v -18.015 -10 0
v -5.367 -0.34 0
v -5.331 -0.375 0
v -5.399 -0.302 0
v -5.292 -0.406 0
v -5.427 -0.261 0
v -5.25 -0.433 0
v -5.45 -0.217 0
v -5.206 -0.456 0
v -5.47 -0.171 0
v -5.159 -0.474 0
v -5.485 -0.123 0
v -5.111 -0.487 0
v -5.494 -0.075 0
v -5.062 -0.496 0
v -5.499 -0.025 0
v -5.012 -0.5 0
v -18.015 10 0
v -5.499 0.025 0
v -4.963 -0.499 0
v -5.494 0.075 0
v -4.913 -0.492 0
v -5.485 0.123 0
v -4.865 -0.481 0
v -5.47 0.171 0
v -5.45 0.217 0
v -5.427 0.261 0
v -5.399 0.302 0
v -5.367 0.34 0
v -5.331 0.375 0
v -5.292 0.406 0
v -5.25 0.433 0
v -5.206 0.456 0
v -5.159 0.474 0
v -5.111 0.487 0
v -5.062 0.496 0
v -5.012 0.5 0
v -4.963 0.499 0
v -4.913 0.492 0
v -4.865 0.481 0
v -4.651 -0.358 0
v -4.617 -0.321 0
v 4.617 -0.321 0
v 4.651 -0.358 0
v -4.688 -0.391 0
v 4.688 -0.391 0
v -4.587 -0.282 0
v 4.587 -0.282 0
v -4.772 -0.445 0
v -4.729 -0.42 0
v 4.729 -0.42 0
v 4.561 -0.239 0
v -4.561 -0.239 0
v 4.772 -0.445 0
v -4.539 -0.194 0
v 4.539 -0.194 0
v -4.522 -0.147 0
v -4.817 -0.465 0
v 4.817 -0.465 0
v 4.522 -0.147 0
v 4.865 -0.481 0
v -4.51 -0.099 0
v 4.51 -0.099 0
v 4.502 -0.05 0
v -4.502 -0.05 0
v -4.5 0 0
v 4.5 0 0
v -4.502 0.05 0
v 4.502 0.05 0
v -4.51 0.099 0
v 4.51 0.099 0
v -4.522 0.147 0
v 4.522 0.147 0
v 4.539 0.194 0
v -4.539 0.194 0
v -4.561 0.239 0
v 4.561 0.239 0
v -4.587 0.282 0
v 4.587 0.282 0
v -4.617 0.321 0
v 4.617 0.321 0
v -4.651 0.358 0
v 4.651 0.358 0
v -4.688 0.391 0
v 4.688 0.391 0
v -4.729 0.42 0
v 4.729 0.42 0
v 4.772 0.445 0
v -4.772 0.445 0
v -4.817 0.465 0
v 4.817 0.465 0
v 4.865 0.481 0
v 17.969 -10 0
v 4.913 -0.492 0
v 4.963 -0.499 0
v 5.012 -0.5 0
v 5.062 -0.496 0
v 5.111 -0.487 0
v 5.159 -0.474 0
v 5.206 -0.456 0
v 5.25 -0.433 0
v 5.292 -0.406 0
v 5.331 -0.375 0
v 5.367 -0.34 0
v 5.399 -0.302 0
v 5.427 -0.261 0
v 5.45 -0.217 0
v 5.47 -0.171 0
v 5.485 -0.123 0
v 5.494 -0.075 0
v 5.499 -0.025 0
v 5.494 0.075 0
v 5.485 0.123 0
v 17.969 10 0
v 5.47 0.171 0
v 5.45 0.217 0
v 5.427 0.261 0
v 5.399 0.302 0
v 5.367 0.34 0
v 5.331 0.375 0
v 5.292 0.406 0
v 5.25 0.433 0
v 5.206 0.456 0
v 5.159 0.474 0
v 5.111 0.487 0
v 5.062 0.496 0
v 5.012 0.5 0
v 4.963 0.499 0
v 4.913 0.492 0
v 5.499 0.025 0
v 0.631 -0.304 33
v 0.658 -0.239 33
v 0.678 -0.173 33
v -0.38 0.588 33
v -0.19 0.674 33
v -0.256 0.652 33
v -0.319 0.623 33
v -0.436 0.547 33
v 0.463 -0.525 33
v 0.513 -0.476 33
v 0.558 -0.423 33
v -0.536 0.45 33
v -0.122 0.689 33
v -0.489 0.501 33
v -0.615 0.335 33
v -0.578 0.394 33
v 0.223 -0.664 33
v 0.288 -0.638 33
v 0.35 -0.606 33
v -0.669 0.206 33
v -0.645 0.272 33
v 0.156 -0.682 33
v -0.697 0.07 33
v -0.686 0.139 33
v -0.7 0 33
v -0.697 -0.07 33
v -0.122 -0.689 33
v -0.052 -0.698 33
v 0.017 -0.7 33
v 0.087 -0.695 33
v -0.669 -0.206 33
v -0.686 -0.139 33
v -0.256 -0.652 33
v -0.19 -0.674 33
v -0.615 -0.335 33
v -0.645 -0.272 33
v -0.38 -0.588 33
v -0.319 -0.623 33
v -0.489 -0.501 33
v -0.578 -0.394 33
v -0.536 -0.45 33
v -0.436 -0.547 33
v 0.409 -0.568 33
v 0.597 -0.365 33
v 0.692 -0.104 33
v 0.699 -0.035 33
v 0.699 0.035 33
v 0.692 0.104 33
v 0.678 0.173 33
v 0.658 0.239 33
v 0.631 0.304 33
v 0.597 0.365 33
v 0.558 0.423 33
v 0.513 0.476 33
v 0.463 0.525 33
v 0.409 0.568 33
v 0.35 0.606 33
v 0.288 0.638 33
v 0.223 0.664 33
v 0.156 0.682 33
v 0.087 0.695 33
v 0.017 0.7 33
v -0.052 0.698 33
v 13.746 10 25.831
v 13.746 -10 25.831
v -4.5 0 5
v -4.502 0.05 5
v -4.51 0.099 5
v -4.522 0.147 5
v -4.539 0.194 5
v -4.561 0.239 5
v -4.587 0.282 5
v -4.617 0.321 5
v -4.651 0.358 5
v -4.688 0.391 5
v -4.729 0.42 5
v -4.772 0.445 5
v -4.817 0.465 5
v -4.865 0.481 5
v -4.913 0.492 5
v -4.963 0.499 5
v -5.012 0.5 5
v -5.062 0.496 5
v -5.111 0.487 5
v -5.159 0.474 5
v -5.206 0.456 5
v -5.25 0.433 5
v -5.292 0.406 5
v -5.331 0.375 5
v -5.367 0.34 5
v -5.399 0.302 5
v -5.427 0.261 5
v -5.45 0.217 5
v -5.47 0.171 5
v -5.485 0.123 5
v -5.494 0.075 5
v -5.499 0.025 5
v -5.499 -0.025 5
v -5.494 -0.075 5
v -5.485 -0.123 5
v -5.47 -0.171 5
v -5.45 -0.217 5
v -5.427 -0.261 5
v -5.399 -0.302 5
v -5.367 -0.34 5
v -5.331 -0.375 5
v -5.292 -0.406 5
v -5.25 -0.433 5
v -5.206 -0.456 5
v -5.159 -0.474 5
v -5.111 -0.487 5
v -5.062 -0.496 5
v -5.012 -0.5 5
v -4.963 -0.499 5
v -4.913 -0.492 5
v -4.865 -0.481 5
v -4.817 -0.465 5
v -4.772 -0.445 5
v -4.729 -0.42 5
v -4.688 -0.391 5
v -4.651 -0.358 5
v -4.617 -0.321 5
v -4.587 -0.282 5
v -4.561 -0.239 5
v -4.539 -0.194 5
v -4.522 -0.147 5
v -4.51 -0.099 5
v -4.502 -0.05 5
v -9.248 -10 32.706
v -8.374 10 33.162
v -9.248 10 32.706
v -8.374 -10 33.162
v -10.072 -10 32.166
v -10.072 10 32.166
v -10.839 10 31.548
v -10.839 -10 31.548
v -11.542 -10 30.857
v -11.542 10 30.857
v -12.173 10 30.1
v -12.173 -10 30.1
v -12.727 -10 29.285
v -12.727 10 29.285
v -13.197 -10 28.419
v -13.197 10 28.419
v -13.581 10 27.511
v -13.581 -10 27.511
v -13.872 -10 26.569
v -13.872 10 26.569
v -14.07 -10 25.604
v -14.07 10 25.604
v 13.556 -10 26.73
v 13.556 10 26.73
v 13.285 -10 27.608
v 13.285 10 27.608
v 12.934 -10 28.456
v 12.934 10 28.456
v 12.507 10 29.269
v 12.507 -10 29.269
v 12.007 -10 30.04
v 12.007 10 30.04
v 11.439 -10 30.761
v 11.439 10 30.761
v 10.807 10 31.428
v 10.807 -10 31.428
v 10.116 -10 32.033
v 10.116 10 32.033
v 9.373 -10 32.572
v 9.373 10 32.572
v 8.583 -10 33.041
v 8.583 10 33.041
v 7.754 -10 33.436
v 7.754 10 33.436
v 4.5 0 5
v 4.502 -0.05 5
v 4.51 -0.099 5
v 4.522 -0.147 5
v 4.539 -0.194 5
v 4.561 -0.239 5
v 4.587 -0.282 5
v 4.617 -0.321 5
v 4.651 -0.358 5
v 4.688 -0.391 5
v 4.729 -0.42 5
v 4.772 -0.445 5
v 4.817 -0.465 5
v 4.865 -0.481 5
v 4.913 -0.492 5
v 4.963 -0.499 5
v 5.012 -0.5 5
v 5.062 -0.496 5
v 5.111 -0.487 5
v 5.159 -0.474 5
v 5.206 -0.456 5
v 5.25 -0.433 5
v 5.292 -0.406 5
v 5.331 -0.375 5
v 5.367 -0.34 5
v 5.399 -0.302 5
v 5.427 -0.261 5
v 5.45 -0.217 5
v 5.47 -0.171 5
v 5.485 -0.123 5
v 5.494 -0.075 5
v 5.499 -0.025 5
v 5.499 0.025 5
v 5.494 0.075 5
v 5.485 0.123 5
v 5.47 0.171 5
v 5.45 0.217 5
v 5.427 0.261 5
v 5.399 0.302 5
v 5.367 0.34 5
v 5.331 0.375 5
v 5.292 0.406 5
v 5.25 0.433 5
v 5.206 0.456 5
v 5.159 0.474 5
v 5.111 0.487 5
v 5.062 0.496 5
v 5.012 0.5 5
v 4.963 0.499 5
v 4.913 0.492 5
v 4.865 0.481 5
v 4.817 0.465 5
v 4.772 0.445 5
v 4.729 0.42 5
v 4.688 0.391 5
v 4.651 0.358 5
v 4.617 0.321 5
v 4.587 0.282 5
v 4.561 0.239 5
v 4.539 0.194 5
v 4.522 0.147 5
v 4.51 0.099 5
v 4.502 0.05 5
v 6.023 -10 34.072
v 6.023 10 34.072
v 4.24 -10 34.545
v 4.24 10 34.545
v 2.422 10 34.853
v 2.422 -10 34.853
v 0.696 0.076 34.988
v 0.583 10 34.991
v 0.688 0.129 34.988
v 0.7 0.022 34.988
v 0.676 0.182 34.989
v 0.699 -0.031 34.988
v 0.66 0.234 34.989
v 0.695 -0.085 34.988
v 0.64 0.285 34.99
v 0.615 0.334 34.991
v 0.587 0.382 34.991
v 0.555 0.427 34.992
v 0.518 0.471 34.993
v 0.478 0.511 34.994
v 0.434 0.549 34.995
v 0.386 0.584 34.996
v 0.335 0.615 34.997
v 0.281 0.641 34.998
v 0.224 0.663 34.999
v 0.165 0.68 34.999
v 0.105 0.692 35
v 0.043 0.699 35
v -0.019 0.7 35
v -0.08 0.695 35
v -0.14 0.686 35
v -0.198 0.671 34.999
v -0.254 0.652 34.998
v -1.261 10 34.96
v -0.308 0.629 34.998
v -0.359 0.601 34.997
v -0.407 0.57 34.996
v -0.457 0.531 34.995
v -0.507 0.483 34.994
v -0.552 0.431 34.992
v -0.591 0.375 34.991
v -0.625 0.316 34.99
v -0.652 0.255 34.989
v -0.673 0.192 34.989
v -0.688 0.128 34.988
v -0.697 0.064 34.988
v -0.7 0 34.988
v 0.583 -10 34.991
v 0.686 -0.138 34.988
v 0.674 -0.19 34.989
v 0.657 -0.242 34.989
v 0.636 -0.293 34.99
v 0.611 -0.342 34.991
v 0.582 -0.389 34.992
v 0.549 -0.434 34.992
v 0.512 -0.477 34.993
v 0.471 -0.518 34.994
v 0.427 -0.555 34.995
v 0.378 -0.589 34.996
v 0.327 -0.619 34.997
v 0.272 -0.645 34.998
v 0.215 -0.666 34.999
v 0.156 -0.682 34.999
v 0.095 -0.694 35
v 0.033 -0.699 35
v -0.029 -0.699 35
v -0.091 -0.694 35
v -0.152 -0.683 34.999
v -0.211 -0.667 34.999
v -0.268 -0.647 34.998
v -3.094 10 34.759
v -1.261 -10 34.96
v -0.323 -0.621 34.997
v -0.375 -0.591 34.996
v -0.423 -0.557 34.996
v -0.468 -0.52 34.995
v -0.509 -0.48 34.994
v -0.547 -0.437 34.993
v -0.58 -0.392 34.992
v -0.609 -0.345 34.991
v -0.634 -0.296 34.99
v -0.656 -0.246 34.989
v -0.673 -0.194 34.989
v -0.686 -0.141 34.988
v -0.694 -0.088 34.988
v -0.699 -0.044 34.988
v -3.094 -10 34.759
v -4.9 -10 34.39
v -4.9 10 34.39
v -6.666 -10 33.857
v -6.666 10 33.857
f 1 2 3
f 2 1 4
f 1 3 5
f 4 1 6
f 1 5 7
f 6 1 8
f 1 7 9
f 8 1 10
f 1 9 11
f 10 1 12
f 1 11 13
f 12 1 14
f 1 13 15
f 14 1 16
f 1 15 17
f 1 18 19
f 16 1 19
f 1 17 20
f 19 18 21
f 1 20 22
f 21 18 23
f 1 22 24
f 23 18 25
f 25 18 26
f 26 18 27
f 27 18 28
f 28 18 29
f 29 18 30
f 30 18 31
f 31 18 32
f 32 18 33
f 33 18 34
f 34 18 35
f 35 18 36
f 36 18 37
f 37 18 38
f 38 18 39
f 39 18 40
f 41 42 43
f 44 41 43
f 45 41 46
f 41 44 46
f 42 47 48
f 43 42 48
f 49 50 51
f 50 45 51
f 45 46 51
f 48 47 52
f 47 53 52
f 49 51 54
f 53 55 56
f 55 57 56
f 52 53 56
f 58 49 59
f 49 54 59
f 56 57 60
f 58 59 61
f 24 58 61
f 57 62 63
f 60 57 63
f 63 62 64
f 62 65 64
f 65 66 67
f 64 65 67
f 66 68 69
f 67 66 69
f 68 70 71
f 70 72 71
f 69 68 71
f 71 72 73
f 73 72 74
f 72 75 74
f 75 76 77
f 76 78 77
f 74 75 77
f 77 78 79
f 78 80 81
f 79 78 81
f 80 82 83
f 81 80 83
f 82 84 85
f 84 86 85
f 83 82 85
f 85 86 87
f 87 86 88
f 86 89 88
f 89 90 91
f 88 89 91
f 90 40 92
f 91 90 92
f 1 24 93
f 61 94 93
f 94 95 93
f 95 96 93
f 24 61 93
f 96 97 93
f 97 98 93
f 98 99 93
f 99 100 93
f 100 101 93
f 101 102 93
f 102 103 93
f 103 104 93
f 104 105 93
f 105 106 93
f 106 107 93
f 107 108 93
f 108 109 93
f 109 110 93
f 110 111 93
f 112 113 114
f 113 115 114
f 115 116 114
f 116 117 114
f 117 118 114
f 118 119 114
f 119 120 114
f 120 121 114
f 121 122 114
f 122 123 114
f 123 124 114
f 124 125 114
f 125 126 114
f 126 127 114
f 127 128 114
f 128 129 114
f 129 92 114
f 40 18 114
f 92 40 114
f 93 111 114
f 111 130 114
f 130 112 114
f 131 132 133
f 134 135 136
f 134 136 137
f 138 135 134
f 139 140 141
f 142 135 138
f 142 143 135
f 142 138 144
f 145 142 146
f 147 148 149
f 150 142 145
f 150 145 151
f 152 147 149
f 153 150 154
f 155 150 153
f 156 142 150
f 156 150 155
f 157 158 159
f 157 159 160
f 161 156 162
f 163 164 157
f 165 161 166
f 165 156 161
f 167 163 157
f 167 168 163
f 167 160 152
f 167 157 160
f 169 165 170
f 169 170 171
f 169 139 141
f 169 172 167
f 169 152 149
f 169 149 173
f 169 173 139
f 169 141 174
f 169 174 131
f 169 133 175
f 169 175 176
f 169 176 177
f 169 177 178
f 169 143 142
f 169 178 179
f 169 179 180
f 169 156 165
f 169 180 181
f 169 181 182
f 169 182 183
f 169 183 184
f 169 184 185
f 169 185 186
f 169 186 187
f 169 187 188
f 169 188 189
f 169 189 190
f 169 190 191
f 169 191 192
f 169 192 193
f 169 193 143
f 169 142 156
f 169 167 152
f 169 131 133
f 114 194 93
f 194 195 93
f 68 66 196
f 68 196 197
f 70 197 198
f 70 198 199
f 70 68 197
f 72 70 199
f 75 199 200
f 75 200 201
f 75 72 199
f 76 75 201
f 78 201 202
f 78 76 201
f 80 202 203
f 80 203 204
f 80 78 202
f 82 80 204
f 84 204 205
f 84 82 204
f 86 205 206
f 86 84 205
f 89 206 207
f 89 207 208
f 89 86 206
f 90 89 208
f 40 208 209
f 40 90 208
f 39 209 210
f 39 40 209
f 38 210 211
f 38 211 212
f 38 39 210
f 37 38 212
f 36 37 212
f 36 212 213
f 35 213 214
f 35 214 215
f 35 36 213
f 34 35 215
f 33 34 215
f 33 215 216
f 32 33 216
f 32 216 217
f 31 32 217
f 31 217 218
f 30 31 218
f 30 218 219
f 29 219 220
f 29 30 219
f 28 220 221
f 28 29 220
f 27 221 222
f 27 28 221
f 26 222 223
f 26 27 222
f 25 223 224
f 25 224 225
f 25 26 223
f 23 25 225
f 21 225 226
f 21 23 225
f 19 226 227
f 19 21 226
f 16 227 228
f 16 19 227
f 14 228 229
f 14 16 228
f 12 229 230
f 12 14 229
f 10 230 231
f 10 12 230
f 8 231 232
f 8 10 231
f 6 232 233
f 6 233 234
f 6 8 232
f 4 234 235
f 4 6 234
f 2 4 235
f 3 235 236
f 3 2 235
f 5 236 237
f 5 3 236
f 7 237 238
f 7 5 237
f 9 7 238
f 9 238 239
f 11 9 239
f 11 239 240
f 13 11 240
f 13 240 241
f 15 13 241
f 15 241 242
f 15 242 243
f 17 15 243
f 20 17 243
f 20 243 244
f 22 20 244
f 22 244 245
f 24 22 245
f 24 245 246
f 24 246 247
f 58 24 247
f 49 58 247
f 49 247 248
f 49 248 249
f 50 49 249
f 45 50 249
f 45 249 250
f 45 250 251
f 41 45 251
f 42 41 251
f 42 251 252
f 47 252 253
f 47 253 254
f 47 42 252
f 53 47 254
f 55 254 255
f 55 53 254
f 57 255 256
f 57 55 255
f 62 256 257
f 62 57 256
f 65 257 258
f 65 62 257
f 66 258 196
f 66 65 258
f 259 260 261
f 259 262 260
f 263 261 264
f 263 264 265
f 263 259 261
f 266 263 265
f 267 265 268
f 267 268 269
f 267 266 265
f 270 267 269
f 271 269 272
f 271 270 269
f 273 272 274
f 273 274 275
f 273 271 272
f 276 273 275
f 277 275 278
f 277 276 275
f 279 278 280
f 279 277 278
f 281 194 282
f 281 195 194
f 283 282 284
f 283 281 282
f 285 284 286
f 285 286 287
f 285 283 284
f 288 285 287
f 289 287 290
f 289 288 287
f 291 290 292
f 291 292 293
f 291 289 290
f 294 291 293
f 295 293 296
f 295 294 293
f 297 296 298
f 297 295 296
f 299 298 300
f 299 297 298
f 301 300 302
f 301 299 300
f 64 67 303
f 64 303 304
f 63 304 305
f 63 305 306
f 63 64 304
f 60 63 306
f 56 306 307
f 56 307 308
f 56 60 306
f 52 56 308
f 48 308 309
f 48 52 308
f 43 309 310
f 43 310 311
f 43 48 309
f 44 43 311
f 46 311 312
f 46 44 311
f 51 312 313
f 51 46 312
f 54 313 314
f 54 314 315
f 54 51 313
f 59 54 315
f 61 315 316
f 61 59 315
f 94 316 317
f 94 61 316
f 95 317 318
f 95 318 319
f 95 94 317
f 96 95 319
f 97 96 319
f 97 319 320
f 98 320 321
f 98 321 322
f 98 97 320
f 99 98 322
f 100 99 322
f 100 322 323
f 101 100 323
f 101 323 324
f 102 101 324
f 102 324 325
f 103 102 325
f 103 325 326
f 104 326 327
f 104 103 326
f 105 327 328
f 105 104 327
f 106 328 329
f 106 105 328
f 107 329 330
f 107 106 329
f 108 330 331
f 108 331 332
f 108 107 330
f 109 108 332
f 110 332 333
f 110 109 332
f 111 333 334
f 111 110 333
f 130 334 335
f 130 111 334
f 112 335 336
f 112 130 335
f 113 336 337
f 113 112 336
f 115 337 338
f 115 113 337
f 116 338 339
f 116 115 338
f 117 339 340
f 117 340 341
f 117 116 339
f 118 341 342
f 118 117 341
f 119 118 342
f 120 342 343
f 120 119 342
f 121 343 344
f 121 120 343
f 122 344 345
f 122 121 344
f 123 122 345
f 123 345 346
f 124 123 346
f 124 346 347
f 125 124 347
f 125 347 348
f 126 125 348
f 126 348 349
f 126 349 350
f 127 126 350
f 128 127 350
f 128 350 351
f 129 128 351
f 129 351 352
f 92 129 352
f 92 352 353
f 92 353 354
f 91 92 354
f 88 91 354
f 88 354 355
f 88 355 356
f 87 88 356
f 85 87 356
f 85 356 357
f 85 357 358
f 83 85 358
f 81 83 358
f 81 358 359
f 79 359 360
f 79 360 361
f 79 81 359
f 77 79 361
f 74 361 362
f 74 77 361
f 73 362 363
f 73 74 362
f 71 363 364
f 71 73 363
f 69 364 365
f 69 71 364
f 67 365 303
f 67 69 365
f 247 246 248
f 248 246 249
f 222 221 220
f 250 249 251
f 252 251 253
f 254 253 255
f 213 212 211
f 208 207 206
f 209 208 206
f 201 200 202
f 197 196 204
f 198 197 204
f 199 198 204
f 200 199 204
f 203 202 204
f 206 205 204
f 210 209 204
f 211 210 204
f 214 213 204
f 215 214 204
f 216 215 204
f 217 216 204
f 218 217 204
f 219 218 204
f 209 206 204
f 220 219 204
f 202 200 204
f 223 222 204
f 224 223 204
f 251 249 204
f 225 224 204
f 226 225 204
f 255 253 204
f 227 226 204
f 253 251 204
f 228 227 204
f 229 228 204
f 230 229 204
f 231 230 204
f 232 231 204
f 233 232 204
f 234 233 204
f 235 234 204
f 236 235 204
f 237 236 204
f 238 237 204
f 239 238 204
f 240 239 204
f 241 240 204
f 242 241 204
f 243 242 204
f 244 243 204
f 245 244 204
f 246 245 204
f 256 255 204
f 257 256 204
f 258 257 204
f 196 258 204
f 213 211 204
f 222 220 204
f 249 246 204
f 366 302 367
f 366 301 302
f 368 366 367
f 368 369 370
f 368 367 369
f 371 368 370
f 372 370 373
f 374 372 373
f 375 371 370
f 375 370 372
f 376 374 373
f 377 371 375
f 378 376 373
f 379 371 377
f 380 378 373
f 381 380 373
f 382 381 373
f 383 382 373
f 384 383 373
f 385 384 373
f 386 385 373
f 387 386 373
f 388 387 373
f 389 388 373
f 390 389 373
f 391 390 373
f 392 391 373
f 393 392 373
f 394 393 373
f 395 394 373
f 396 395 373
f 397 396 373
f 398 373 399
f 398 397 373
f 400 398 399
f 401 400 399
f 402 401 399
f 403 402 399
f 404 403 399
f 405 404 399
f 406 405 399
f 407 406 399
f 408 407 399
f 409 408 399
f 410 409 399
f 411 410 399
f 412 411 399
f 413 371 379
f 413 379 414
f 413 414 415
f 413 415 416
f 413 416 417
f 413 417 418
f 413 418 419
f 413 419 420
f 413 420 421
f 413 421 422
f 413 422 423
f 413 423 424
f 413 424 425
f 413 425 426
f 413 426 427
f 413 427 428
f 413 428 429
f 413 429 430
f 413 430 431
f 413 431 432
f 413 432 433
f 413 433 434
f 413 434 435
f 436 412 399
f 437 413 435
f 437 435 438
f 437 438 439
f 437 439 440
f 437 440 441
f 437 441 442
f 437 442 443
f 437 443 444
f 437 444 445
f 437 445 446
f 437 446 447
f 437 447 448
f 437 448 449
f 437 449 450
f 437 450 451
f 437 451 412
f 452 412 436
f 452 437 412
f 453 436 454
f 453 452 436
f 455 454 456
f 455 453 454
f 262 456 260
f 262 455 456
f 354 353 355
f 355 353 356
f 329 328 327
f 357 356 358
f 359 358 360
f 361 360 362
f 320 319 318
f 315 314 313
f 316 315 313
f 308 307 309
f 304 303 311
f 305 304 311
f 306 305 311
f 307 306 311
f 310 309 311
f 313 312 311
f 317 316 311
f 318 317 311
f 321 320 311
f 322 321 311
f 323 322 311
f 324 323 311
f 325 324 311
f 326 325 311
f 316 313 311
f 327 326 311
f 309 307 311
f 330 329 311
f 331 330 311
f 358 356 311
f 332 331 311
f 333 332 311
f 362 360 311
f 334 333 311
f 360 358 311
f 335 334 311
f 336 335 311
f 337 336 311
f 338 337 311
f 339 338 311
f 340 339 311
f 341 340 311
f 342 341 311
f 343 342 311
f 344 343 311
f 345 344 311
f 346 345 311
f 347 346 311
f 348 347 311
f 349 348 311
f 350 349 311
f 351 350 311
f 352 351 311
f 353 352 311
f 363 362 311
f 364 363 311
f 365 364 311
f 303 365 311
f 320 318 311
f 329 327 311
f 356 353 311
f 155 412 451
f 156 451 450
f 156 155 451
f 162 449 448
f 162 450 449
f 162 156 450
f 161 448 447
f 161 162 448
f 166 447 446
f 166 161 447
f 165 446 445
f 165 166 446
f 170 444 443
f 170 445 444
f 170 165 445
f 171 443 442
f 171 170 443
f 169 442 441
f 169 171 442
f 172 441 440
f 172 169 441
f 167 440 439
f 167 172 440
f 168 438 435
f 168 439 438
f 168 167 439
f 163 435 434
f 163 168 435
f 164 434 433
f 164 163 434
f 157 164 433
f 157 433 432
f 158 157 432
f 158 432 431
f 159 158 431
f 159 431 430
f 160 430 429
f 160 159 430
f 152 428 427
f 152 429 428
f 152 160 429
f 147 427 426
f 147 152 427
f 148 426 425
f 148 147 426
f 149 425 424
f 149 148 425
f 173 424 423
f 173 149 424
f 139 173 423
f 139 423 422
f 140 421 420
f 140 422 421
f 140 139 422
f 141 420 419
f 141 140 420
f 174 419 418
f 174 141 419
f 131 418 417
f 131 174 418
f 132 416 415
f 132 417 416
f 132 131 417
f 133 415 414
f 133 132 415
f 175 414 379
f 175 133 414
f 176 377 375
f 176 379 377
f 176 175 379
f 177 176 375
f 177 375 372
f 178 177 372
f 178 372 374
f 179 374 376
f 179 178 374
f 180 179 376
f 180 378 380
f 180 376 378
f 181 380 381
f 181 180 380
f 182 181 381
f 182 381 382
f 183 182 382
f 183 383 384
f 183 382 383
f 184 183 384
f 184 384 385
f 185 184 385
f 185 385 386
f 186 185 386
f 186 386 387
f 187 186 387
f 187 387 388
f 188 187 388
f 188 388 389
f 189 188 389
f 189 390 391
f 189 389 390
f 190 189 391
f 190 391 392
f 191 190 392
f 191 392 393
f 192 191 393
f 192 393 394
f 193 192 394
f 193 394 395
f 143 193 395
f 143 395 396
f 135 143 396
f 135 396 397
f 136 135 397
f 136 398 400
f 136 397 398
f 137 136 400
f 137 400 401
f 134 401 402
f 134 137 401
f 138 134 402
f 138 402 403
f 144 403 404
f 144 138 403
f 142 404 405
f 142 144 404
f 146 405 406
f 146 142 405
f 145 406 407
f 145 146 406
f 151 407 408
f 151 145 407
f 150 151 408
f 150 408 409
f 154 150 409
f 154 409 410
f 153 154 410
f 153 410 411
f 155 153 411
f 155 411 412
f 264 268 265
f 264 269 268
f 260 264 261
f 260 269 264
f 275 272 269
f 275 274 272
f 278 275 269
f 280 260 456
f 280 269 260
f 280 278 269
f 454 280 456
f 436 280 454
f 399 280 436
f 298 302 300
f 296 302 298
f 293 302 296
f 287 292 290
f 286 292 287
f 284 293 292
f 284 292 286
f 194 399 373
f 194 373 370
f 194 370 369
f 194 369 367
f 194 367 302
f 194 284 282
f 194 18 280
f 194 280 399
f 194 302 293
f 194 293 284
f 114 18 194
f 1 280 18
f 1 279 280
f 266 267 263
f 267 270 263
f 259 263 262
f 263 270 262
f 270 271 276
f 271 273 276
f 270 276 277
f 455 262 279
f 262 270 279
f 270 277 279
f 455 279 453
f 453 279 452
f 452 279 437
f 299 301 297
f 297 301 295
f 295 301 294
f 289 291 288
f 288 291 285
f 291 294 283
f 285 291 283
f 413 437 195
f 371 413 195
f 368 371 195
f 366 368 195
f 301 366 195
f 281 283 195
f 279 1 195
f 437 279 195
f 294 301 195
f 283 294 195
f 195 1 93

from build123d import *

# Parameters (mm, degrees)
SKETCH1_W               = 40
SKETCH1_H               = 20
BOSS_EXTRUDE1_DEPTH     = 35
FILLET1_RADIUS          = 20
FILLET1_LENGTH          = 20
CUT_EXTRUDE1_DEPTH      = 42.533119315
CUT_EXTRUDE1_DEPTH_BACK = 42.533119315
CUT_EXTRUDE2_DEPTH      = 42.533119315
CUT_EXTRUDE2_DEPTH_BACK = 42.533119315
FILLET2_R               = 10
FILLET3_R               = 10
SKETCH7_R               = 0.7
CUT_EXTRUDE3_DEPTH      = 35
SKETCH10_R              = 0.5
CUT_EXTRUDE4_DEPTH      = 5


with BuildPart() as part:
    # Sketch1 → Boss-Extrude1 (new body)
    with BuildSketch(Plane.XY):
        Rectangle(SKETCH1_W, SKETCH1_H)
    extrude(amount=BOSS_EXTRUDE1_DEPTH)

    # Fillet1: full round fillet: the end face becomes a half cylinder, R = half its width
    fillet1_face = Plane((0, 0, 35), x_dir=(0, -1, 0), z_dir=(0, 0, 1))  # on the end face: x along it, z out of the body
    fillet1_slab = fillet1_face.offset(-FILLET1_RADIUS / 2) * Box(FILLET1_LENGTH, 2 * FILLET1_RADIUS, FILLET1_RADIUS, mode=Mode.PRIVATE)  # the body's end, R deep
    fillet1_round = Plane((0, 0, 15), x_dir=(0, 0, 1), z_dir=(0, -1, 0)) * Cylinder(FILLET1_RADIUS, FILLET1_LENGTH, mode=Mode.PRIVATE)  # its axis R under the face
    add(fillet1_slab - fillet1_round, mode=Mode.SUBTRACT)

    # Sketch3 → Cut-Extrude1 (cut, two sides: drawn at the far end of the back side and taken through both)
    with BuildSketch(Plane(origin=(0, 0, 0), x_dir=(1, 0, 0), z_dir=(0, 1, 0)).offset(-CUT_EXTRUDE1_DEPTH_BACK)):
        Polygon((-12.624608069, -34.987358945), (-18.720278541, 4.574737646), (-30.971557894, -1.916976114), (-24.875887422, -41.479072706), align=None)
    extrude(amount=CUT_EXTRUDE1_DEPTH + CUT_EXTRUDE1_DEPTH_BACK, mode=Mode.SUBTRACT)

    # Sketch4 → Cut-Extrude2 (cut, two sides: drawn at the far end of the back side and taken through both)
    with BuildSketch(Plane(origin=(0, 0, 0), x_dir=(1, 0, 0), z_dir=(0, 1, 0)).offset(-CUT_EXTRUDE2_DEPTH_BACK)):
        Polygon((11.956946172, -36.772482669), (19.210484507, 7.59218203), (33.970591583, -6.999238108), (26.717053249, -51.363902807), align=None)
    extrude(amount=CUT_EXTRUDE2_DEPTH + CUT_EXTRUDE2_DEPTH_BACK, mode=Mode.SUBTRACT)

    # Fillet2
    fillet2_edges = [part.edges().sort_by_distance(p)[0] for p in [
        (13.036926478, 0, 30.167021725),
    ]]
    fillet(fillet2_edges, radius=FILLET2_R)

    # Fillet3
    fillet3_edges = [part.edges().sort_by_distance(p)[0] for p in [
        (-13.419277094, 0, 29.829801154),
    ]]
    fillet(fillet3_edges, radius=FILLET3_R)

    # Sketch7 → Cut-Extrude3 (cut)
    with BuildSketch(Plane.XY.offset(33)):
        with Locations(Location((0, 0, 0), (0, 0, 180))):
            Circle(SKETCH7_R)
    extrude(amount=CUT_EXTRUDE3_DEPTH, mode=Mode.SUBTRACT)

    # Sketch10 → Cut-Extrude4 (cut)
    with BuildSketch(Plane.XY):
        with Locations((-5, 0)):
            Circle(SKETCH10_R)
        with Locations(Location((5, 0, 0), (0, 0, 180))):
            Circle(SKETCH10_R)
    extrude(amount=CUT_EXTRUDE4_DEPTH, mode=Mode.SUBTRACT)


solid = part.part
